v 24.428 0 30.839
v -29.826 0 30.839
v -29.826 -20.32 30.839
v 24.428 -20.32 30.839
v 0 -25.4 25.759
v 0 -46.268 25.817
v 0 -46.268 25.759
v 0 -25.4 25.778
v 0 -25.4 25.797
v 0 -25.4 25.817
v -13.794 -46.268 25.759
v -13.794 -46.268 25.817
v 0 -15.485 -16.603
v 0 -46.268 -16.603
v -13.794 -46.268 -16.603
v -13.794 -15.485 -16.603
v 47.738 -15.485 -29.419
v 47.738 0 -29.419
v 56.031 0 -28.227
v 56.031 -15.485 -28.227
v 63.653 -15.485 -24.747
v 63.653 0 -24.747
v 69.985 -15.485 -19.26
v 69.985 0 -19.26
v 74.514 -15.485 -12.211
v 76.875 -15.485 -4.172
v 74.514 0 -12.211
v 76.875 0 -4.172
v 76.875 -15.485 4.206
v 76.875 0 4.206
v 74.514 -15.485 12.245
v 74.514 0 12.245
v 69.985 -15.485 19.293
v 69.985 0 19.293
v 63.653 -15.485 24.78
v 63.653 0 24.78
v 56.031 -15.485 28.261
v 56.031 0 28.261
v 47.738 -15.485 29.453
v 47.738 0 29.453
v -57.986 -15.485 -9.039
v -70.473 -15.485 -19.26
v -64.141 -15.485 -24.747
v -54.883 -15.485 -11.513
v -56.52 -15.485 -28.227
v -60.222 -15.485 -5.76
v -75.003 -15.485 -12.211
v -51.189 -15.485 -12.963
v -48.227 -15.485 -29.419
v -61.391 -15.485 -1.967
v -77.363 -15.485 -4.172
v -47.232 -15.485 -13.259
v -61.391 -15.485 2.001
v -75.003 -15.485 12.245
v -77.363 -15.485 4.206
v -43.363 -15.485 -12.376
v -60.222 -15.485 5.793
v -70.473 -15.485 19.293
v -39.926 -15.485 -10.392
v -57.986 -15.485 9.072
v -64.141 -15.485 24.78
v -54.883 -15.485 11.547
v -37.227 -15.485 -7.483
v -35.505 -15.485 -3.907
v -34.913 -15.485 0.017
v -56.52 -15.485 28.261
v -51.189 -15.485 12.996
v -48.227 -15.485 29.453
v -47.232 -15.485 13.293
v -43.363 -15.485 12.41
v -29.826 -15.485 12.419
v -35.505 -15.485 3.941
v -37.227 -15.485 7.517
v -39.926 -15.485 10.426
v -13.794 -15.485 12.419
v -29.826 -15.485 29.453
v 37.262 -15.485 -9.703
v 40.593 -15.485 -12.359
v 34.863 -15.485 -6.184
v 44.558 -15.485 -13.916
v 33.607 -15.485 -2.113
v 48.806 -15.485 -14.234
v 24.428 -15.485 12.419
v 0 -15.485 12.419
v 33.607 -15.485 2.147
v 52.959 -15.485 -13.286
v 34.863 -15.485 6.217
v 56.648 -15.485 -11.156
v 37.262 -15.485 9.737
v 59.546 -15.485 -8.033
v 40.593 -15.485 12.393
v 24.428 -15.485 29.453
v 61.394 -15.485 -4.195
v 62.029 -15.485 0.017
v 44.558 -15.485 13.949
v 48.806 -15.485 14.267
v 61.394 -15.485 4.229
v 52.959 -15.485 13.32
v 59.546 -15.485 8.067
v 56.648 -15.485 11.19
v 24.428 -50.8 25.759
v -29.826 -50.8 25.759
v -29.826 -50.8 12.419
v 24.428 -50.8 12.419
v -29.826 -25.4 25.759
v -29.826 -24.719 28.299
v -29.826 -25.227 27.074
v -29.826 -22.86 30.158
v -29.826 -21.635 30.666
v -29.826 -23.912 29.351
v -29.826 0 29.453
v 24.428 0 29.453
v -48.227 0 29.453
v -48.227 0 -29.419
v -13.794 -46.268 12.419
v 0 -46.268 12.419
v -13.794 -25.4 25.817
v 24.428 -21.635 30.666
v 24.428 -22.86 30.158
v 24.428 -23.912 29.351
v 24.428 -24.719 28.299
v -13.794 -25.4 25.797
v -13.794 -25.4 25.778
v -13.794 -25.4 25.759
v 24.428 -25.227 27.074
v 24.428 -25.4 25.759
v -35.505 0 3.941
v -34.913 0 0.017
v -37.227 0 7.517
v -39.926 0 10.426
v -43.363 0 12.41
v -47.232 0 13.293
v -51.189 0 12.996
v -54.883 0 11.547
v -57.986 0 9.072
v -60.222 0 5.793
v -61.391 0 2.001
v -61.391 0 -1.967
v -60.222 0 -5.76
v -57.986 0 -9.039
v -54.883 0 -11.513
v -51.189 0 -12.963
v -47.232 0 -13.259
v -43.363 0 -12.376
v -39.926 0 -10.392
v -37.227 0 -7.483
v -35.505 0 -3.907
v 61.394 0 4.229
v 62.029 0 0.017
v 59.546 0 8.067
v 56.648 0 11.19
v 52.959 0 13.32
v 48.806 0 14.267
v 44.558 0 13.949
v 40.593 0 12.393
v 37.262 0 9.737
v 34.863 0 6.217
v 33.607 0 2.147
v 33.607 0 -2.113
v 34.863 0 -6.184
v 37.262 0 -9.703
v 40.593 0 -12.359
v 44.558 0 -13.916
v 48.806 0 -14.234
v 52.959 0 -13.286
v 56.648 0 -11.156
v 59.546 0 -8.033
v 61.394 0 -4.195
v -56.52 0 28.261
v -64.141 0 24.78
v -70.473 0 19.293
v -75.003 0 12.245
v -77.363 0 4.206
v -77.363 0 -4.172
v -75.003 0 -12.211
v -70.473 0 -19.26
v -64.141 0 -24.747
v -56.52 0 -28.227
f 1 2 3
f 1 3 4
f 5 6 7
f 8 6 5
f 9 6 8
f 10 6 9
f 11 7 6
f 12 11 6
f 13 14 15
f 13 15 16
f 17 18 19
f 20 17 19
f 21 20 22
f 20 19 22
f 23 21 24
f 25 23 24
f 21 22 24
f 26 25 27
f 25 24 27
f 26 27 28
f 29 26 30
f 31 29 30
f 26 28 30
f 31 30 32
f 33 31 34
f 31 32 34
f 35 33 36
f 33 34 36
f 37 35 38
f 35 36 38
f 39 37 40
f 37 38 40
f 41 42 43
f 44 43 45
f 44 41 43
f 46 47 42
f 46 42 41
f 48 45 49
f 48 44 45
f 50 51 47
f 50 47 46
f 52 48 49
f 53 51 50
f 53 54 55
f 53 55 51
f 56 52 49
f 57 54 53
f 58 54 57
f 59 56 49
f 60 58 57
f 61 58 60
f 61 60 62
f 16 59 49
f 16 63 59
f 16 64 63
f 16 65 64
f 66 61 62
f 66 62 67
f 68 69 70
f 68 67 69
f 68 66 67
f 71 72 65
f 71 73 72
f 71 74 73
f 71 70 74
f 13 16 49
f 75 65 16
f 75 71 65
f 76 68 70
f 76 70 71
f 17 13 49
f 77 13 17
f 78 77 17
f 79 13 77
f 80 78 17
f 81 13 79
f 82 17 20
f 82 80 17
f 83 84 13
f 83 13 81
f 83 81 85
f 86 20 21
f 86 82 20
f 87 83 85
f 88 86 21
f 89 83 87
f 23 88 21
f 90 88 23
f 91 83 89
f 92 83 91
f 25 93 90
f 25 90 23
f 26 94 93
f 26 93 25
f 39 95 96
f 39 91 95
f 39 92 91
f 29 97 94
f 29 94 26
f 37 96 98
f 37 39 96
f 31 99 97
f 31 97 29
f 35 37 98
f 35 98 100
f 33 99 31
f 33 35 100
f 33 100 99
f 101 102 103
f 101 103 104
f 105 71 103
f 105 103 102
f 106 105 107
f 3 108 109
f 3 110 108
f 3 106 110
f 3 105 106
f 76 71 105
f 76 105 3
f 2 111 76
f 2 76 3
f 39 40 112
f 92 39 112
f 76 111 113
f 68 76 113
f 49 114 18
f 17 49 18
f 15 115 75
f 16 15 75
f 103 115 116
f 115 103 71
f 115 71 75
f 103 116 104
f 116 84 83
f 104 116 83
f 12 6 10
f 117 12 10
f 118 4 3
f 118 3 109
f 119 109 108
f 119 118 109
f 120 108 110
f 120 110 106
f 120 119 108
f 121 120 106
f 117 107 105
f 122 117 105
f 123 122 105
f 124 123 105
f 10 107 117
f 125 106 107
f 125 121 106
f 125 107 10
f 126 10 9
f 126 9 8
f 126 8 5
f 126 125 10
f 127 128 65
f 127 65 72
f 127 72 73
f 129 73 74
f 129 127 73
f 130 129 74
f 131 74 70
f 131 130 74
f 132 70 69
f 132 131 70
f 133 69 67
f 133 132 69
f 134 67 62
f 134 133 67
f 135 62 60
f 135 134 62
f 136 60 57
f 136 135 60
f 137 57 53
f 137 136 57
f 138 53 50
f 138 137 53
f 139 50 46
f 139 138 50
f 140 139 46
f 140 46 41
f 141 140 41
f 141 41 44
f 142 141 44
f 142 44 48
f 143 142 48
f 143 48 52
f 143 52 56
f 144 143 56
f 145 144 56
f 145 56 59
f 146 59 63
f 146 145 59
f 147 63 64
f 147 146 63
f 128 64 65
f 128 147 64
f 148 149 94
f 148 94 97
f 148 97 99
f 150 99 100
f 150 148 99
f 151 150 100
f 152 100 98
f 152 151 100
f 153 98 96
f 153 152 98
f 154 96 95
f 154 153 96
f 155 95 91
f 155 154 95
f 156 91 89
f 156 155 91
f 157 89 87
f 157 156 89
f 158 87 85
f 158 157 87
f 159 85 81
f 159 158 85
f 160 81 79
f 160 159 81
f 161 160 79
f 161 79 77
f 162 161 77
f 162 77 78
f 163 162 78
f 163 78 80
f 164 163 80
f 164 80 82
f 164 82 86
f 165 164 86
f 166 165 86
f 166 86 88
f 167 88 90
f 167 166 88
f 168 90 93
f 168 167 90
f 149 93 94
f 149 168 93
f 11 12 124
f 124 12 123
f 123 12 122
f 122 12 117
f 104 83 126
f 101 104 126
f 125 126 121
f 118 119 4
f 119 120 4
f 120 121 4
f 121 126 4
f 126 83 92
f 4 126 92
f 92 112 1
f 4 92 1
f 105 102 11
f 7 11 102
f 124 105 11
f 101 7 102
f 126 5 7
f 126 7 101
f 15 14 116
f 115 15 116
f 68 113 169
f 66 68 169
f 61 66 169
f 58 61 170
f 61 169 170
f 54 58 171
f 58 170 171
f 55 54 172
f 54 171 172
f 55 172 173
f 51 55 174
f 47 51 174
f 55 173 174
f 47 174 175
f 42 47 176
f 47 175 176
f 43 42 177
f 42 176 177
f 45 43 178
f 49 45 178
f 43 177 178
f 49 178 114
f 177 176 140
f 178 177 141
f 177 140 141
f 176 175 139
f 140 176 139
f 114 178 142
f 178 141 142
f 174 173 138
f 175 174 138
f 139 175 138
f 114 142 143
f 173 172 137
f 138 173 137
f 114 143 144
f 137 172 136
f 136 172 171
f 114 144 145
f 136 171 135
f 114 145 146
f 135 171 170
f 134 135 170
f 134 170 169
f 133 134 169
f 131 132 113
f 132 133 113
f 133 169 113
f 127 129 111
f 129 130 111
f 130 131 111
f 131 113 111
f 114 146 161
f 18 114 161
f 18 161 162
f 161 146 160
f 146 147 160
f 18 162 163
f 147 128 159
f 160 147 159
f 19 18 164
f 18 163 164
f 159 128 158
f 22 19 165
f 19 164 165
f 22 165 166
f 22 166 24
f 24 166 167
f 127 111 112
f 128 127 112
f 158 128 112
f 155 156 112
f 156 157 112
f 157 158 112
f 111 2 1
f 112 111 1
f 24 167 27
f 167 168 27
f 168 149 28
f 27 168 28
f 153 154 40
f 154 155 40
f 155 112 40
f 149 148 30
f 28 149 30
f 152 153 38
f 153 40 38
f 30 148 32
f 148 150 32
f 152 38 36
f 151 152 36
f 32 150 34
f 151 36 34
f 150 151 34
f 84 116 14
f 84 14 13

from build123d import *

# Parameters (mm, degrees)
F0_R     = 13.3135020733
F0_R_2   = 14.2906457186
F1_DEPTH = 15.4849458486
F2_W     = 54.254218936
F2_H     = 18.4195190668
F3_DEPTH = 25.4
F4_R     = 5.08
F5_DEPTH = 25.4
F6_W     = 46.2679080665
F6_H     = 42.419552803
F7_DEPTH = 13.794451952


# Not quite as in the source:
# - the program builds the solid bodies; features that only make, move or delete a surface that nothing else refers to are left out


with BuildPart() as f1:
    # F0 (on Front) → F1 (new body)
    with BuildSketch(Plane.XZ):
        with BuildLine():
            Line((47.7382689714, 29.4530540705), (-48.2266321778, 29.4530540705))
            ThreePointArc((-48.2266321778, 29.4530540705), (-77.6628926396, 0.0167936087), (-48.2266321778, -29.4194668531))
            Line((-48.2266321778, -29.4194668531), (47.7382689714, -29.4194668531))
            ThreePointArc((47.7382689714, -29.4194668531), (77.1745294333, 0.0167936087), (47.7382689714, 29.4530540705))
        make_face()
        with Locations((-48.2266321778, 0.0167936087)):
            Circle(F0_R, mode=Mode.SUBTRACT)
        with Locations((47.7382689714, 0.0167936087)):
            Circle(F0_R_2, mode=Mode.SUBTRACT)
    extrude(amount=F1_DEPTH)

    # F2 (on Front) → F3 (join)
    with BuildSketch(Plane.XZ):
        with Locations((-2.6991143823, 21.6291323304)):
            Rectangle(F2_W, F2_H)
    extrude(amount=F3_DEPTH)

    # F4
    f4_edges = [f1.edges().sort_by_distance(p)[0] for p in [
        (-2.699114, -25.4, 30.838892),
    ]]
    fillet(f4_edges, radius=F4_R)

    # F5 (add): a face of the model
    f5_faces = [f1.faces().sort_by_distance(p)[0] for p in [
        (-2.6991143823, -25.4, 19.0891323304),
    ]]
    extrude(f5_faces, amount=F5_DEPTH)

    # F6 (on Right) → F7 (join)
    with BuildSketch(Plane.YZ):
        with Locations((-23.1339540333, 4.6068131924)):
            Rectangle(F6_W, F6_H)
    extrude(amount=-F7_DEPTH)


solid = f1.part
